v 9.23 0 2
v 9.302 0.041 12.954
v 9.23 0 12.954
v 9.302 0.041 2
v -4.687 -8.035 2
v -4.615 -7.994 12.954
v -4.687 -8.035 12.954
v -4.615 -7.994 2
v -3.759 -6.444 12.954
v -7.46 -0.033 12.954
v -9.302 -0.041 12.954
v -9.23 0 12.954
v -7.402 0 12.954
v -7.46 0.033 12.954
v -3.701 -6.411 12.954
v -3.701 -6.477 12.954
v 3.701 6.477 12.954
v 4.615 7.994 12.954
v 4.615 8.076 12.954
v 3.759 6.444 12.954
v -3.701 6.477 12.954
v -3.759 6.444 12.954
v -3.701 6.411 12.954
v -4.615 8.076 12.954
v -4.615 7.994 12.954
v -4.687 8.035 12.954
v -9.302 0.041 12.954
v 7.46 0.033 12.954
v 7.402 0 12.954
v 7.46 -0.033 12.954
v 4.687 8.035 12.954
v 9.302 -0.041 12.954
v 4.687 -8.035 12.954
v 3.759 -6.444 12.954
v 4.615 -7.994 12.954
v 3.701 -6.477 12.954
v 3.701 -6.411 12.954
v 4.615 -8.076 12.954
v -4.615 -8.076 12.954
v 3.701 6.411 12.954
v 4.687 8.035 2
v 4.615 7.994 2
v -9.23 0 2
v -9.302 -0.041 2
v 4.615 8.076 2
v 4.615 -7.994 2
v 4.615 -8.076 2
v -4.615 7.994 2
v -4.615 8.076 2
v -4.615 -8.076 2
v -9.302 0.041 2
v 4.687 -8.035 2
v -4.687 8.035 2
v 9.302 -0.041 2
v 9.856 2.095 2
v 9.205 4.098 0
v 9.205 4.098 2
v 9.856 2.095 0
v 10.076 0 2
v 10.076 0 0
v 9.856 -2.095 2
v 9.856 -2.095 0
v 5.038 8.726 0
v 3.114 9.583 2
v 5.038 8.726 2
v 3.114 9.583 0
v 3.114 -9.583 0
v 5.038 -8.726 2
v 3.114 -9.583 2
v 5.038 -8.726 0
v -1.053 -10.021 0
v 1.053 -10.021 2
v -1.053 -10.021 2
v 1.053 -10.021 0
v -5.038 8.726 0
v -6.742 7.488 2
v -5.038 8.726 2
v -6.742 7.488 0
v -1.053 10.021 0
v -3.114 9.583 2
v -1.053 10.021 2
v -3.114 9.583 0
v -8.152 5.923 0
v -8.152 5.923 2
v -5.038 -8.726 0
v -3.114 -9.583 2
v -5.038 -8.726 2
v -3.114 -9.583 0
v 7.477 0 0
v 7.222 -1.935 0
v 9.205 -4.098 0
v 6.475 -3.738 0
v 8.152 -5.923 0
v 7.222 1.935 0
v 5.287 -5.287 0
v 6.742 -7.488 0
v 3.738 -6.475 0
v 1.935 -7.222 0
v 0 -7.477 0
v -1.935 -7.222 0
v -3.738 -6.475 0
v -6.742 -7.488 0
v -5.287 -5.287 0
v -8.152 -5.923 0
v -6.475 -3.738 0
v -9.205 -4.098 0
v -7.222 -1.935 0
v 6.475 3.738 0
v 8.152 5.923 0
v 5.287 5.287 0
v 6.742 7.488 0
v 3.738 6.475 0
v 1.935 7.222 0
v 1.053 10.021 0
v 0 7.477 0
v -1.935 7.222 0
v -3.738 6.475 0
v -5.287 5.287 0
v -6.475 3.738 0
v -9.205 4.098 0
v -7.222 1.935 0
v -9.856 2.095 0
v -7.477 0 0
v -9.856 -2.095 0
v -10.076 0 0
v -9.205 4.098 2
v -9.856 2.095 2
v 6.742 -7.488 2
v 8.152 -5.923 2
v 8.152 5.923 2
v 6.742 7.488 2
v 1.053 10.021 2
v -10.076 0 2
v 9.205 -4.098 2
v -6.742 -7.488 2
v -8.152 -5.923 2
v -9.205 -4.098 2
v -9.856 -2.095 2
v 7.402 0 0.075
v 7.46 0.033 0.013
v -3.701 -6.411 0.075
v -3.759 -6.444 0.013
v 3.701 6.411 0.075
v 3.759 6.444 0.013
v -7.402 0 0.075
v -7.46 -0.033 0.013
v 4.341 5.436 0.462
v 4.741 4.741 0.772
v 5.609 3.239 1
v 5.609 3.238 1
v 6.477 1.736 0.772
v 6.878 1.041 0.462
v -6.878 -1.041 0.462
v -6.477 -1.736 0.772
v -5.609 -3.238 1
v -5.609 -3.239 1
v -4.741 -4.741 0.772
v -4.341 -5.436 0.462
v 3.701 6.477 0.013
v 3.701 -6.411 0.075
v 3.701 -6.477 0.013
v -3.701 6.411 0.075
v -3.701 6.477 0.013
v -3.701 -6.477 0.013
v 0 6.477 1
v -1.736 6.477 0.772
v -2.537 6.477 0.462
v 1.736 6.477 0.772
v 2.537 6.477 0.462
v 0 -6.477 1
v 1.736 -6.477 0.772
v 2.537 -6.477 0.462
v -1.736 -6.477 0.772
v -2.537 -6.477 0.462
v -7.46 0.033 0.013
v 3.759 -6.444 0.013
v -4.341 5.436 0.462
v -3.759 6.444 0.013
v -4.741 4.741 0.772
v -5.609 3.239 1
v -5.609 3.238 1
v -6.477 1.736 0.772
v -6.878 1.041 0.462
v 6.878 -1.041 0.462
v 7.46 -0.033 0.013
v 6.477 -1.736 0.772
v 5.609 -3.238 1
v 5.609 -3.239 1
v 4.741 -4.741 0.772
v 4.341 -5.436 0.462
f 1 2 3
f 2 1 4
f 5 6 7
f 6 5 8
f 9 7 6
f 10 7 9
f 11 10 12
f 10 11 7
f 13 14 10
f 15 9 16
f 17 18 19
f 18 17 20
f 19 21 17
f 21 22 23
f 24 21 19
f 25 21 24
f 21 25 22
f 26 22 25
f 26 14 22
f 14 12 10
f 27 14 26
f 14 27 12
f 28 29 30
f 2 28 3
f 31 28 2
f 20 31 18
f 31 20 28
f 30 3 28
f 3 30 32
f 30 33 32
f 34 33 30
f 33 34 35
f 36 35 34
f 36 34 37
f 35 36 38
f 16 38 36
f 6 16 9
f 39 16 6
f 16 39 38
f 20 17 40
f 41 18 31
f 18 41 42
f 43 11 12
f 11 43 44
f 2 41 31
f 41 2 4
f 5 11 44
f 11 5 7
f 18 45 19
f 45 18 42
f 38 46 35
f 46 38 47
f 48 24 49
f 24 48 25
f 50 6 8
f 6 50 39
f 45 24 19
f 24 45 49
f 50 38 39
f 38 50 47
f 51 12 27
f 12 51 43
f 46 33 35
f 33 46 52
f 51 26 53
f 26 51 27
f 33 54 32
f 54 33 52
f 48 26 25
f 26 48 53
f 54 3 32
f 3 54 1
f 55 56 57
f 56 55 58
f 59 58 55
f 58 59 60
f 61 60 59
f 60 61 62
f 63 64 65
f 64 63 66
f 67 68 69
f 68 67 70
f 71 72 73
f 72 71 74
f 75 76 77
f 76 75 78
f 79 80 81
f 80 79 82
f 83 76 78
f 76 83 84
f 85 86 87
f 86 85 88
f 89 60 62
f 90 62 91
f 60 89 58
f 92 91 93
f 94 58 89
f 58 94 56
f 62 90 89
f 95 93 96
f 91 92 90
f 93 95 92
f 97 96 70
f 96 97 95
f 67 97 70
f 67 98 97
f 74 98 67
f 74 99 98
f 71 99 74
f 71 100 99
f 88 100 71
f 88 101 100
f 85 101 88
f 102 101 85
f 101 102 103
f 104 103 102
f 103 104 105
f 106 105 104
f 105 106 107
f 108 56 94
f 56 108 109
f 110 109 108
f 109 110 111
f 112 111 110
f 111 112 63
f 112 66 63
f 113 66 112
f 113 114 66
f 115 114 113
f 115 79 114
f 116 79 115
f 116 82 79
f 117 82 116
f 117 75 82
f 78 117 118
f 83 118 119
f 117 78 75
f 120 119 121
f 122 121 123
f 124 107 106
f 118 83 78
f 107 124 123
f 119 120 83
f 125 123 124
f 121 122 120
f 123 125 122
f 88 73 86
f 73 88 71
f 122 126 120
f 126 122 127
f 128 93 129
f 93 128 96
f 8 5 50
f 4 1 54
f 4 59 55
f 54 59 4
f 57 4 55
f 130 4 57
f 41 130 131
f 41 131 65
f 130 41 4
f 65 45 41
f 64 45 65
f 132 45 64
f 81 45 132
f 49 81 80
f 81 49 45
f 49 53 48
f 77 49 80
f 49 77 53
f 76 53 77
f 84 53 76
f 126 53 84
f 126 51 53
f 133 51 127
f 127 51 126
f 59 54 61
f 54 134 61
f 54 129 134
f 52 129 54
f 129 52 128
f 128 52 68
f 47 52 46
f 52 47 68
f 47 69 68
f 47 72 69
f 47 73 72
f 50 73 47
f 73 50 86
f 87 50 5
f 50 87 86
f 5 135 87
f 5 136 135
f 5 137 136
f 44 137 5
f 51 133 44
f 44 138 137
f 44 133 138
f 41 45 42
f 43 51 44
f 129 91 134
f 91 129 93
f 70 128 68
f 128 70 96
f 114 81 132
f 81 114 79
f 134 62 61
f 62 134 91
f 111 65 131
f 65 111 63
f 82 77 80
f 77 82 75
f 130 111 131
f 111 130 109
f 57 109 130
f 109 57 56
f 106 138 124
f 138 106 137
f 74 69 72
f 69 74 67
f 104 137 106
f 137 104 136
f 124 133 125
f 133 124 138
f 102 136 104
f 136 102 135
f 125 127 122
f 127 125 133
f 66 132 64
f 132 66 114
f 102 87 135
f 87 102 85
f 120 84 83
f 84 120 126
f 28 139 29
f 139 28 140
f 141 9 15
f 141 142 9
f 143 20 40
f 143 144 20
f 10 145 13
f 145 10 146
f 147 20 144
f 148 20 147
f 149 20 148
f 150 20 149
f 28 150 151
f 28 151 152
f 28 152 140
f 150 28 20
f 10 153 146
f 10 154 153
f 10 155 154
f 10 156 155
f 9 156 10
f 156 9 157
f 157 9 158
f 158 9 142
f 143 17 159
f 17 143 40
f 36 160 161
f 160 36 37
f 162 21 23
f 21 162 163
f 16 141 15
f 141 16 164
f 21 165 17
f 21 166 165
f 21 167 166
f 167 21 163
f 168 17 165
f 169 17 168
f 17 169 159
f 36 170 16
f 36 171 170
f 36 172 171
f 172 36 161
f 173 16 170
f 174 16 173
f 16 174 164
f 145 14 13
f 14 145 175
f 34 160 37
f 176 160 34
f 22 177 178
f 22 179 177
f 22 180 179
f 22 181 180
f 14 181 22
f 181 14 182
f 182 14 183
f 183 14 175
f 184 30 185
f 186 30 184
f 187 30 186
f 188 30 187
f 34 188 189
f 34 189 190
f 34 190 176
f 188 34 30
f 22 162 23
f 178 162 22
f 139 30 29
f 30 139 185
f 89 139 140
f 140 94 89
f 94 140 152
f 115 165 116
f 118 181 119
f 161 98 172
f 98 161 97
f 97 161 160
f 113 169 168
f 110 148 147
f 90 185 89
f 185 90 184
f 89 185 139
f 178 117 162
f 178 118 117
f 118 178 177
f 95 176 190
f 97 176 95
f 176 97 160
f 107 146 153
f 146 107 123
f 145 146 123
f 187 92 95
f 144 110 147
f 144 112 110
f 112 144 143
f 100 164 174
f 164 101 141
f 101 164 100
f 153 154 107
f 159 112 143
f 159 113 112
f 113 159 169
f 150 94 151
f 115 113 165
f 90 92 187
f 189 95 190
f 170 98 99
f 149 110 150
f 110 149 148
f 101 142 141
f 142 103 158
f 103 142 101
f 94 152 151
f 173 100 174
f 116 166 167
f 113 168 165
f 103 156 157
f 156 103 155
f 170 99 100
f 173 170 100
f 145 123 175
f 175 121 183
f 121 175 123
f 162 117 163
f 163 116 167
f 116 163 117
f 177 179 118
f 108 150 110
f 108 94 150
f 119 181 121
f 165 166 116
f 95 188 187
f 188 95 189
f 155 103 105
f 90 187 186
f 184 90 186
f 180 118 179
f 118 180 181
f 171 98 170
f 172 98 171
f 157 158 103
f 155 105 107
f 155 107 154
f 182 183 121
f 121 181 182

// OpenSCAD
//size of nut to fit in 16ths
inside16=8;
//size of socket to fit in 16ths
outside16=10;
//%shrink to allow for on inside(nut)
shrinkinside=2;
//%shrink to allow for on outside(socket) 
shrinkoutside=1.75;
heightmultiplier=1;

inside=inside16/16*25.4*(1+shrinkinside/100);
outside=outside16/16*25.4*(1+shrinkoutside/100);
th=inside*heightmultiplier;

	difference(){
		union(){
			translate([0,0,th/2])hexagon(outside,th);
			cylinder(h=2,r=(outside+4)/2);
			}
		translate([0,0,th/2-1])hexagon(inside,th+2);
		cylinder(h=1,r2=inside/2,r1=inside/2+1);
		}

module hexagon(size, height) {
  boxWidth = size/1.75;
  for (r = [-60, 0, 60]) rotate([0,0,r]) cube([boxWidth, size, height], true);
}
